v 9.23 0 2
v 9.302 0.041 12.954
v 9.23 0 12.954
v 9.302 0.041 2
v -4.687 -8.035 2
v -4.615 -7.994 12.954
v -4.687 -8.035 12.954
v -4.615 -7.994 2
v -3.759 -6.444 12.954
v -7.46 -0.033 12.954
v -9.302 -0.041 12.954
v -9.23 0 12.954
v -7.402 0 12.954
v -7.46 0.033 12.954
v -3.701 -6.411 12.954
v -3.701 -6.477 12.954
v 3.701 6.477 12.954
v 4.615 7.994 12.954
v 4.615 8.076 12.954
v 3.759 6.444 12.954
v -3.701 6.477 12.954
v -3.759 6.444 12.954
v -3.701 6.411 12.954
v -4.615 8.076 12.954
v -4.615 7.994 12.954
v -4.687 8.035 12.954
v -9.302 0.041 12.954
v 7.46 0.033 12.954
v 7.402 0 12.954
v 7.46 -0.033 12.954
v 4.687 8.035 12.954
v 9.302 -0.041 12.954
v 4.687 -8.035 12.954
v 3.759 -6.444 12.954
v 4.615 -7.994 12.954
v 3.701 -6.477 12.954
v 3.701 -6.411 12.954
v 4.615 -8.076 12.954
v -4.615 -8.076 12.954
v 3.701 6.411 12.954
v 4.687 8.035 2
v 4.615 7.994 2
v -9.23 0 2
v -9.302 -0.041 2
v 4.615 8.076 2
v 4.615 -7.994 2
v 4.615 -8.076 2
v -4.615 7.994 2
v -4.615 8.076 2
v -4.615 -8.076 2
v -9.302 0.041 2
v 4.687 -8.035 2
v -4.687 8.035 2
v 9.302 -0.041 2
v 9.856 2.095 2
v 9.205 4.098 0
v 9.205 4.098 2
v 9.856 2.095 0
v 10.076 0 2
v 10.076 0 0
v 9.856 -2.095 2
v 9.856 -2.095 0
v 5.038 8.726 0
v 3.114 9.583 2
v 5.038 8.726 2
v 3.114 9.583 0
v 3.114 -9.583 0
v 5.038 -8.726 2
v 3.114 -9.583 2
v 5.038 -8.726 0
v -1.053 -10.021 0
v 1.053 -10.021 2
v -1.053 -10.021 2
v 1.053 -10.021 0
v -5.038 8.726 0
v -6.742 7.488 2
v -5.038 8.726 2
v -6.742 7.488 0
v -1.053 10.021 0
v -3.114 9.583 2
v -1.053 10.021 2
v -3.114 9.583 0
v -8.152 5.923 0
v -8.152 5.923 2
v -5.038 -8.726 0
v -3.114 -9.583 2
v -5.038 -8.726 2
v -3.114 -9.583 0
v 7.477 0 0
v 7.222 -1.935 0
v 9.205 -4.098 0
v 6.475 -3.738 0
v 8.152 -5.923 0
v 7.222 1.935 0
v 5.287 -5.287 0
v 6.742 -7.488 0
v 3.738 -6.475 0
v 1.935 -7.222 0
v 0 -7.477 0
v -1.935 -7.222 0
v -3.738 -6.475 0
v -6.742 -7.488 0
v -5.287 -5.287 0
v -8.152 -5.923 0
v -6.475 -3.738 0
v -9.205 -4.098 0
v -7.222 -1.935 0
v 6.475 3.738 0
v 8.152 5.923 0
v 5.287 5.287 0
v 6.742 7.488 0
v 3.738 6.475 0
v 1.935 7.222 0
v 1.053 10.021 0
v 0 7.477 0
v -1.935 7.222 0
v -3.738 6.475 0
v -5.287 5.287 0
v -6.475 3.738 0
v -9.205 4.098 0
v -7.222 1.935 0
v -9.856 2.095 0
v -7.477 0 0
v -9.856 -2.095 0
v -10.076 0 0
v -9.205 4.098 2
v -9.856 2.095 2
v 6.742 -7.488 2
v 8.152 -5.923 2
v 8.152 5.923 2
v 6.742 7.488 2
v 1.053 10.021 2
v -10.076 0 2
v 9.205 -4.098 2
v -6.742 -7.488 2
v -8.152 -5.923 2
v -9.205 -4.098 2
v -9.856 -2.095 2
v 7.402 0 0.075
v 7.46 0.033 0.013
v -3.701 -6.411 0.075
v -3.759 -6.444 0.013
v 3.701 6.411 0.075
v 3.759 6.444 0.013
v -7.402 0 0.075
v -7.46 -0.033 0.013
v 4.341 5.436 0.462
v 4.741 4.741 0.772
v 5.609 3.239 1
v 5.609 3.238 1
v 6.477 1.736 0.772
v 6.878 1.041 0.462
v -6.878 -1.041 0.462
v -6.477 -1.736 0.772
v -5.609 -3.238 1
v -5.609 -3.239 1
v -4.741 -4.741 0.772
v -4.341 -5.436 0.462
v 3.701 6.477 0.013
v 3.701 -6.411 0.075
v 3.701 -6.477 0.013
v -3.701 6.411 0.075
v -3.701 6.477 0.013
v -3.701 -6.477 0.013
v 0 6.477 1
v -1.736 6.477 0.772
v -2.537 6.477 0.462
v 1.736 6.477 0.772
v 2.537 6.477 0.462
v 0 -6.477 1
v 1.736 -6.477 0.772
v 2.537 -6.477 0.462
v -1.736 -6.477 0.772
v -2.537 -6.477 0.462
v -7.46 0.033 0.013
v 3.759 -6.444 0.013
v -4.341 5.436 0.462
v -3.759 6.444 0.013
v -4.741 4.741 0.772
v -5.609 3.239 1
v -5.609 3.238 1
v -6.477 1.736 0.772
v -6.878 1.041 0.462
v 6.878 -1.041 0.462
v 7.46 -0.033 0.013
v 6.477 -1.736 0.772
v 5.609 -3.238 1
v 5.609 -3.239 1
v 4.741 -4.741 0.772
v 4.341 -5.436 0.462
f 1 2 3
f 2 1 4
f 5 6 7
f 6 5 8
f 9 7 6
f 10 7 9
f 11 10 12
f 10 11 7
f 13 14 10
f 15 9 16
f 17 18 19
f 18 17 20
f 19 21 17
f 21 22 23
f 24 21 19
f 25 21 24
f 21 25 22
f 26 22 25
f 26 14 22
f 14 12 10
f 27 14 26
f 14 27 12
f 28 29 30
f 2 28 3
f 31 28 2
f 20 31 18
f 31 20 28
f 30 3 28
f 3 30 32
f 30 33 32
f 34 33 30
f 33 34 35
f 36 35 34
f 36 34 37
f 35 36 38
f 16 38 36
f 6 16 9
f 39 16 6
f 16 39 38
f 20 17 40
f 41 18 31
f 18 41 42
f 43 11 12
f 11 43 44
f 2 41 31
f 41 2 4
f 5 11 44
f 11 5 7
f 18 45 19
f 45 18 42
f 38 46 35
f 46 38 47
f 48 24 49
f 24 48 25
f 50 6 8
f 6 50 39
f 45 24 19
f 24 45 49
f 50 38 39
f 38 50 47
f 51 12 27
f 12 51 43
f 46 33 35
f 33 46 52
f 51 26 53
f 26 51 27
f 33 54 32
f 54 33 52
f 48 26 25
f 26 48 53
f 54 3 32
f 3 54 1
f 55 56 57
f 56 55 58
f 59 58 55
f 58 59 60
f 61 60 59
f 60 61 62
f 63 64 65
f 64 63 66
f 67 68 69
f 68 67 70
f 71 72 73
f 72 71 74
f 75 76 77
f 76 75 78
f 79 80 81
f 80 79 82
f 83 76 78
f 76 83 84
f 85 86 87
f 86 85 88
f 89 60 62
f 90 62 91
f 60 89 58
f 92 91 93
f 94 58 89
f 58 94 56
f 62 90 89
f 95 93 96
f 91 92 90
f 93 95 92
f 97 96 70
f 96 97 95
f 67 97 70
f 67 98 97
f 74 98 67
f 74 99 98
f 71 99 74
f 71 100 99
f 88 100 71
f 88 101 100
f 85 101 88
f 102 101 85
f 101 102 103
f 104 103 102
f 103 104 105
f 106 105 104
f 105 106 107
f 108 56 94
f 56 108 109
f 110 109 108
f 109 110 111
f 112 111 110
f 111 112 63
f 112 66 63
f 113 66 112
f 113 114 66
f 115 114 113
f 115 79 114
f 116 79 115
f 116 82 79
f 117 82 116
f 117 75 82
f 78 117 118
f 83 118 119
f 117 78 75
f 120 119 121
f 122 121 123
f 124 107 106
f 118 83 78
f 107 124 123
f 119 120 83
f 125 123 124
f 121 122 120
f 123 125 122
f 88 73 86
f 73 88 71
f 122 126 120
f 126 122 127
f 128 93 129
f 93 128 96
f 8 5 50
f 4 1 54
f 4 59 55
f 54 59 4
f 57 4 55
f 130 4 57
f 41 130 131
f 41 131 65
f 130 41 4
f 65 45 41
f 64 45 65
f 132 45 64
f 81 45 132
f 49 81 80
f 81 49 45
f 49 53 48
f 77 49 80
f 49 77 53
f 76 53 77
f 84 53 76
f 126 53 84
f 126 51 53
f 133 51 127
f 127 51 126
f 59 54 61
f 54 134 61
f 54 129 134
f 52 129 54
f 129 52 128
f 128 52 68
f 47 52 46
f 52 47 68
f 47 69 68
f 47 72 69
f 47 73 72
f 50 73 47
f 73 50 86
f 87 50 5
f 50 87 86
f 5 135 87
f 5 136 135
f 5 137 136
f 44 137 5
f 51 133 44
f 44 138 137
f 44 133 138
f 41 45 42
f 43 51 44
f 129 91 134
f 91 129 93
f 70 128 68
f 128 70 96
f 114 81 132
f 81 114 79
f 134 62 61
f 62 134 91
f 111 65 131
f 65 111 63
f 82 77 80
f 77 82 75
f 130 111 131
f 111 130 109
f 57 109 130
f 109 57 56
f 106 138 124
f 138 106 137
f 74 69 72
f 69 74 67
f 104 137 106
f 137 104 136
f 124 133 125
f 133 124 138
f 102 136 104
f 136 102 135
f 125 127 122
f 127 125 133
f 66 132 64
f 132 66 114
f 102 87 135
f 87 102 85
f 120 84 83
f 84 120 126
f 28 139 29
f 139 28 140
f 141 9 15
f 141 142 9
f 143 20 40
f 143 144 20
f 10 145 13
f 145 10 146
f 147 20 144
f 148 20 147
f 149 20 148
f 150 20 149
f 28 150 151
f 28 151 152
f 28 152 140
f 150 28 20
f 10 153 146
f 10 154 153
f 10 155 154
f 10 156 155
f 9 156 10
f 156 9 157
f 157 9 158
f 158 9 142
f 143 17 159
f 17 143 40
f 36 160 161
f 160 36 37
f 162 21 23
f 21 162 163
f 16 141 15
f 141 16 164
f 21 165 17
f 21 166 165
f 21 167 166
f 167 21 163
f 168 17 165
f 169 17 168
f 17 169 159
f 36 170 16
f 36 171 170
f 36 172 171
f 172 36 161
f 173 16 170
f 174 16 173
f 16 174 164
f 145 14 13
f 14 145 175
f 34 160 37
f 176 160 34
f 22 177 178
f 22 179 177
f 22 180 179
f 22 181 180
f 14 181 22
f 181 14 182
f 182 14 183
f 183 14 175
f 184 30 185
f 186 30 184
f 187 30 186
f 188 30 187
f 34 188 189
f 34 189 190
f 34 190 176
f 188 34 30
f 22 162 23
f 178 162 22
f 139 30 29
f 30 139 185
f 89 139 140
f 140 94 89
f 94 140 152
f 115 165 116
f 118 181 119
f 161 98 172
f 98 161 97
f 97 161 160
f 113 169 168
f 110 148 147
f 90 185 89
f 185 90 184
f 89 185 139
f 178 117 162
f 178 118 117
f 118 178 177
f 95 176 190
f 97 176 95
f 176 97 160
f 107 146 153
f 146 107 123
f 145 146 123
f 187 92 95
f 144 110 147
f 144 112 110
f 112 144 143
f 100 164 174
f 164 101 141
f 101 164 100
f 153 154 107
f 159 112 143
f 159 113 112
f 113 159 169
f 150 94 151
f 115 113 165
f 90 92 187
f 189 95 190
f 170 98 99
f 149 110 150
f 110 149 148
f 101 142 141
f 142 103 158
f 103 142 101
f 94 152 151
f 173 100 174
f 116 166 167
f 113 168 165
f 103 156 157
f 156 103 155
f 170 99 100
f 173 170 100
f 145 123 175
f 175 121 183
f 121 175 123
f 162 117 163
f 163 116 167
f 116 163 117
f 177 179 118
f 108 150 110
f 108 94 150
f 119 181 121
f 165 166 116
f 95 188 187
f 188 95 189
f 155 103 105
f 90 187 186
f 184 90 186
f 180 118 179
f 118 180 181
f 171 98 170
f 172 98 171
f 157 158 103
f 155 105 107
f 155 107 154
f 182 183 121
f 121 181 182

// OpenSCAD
//size of nut to fit in 16ths
inside16=8;
//size of socket to fit in 16ths
outside16=10;
//%shrink to allow for on inside(nut)
shrinkinside=2;
//%shrink to allow for on outside(socket) 
shrinkoutside=1.75;
heightmultiplier=1;

inside=inside16/16*25.4*(1+shrinkinside/100);
outside=outside16/16*25.4*(1+shrinkoutside/100);
th=inside*heightmultiplier;

	difference(){
		union(){
			translate([0,0,th/2])hexagon(outside,th);
			cylinder(h=2,r=(outside+4)/2);
			}
		translate([0,0,th/2-1])hexagon(inside,th+2);
		cylinder(h=1,r2=inside/2,r1=inside/2+1);
		}

module hexagon(size, height) {
  boxWidth = size/1.75;
  for (r = [-60, 0, 60]) rotate([0,0,r]) cube([boxWidth, size, height], true);
}
